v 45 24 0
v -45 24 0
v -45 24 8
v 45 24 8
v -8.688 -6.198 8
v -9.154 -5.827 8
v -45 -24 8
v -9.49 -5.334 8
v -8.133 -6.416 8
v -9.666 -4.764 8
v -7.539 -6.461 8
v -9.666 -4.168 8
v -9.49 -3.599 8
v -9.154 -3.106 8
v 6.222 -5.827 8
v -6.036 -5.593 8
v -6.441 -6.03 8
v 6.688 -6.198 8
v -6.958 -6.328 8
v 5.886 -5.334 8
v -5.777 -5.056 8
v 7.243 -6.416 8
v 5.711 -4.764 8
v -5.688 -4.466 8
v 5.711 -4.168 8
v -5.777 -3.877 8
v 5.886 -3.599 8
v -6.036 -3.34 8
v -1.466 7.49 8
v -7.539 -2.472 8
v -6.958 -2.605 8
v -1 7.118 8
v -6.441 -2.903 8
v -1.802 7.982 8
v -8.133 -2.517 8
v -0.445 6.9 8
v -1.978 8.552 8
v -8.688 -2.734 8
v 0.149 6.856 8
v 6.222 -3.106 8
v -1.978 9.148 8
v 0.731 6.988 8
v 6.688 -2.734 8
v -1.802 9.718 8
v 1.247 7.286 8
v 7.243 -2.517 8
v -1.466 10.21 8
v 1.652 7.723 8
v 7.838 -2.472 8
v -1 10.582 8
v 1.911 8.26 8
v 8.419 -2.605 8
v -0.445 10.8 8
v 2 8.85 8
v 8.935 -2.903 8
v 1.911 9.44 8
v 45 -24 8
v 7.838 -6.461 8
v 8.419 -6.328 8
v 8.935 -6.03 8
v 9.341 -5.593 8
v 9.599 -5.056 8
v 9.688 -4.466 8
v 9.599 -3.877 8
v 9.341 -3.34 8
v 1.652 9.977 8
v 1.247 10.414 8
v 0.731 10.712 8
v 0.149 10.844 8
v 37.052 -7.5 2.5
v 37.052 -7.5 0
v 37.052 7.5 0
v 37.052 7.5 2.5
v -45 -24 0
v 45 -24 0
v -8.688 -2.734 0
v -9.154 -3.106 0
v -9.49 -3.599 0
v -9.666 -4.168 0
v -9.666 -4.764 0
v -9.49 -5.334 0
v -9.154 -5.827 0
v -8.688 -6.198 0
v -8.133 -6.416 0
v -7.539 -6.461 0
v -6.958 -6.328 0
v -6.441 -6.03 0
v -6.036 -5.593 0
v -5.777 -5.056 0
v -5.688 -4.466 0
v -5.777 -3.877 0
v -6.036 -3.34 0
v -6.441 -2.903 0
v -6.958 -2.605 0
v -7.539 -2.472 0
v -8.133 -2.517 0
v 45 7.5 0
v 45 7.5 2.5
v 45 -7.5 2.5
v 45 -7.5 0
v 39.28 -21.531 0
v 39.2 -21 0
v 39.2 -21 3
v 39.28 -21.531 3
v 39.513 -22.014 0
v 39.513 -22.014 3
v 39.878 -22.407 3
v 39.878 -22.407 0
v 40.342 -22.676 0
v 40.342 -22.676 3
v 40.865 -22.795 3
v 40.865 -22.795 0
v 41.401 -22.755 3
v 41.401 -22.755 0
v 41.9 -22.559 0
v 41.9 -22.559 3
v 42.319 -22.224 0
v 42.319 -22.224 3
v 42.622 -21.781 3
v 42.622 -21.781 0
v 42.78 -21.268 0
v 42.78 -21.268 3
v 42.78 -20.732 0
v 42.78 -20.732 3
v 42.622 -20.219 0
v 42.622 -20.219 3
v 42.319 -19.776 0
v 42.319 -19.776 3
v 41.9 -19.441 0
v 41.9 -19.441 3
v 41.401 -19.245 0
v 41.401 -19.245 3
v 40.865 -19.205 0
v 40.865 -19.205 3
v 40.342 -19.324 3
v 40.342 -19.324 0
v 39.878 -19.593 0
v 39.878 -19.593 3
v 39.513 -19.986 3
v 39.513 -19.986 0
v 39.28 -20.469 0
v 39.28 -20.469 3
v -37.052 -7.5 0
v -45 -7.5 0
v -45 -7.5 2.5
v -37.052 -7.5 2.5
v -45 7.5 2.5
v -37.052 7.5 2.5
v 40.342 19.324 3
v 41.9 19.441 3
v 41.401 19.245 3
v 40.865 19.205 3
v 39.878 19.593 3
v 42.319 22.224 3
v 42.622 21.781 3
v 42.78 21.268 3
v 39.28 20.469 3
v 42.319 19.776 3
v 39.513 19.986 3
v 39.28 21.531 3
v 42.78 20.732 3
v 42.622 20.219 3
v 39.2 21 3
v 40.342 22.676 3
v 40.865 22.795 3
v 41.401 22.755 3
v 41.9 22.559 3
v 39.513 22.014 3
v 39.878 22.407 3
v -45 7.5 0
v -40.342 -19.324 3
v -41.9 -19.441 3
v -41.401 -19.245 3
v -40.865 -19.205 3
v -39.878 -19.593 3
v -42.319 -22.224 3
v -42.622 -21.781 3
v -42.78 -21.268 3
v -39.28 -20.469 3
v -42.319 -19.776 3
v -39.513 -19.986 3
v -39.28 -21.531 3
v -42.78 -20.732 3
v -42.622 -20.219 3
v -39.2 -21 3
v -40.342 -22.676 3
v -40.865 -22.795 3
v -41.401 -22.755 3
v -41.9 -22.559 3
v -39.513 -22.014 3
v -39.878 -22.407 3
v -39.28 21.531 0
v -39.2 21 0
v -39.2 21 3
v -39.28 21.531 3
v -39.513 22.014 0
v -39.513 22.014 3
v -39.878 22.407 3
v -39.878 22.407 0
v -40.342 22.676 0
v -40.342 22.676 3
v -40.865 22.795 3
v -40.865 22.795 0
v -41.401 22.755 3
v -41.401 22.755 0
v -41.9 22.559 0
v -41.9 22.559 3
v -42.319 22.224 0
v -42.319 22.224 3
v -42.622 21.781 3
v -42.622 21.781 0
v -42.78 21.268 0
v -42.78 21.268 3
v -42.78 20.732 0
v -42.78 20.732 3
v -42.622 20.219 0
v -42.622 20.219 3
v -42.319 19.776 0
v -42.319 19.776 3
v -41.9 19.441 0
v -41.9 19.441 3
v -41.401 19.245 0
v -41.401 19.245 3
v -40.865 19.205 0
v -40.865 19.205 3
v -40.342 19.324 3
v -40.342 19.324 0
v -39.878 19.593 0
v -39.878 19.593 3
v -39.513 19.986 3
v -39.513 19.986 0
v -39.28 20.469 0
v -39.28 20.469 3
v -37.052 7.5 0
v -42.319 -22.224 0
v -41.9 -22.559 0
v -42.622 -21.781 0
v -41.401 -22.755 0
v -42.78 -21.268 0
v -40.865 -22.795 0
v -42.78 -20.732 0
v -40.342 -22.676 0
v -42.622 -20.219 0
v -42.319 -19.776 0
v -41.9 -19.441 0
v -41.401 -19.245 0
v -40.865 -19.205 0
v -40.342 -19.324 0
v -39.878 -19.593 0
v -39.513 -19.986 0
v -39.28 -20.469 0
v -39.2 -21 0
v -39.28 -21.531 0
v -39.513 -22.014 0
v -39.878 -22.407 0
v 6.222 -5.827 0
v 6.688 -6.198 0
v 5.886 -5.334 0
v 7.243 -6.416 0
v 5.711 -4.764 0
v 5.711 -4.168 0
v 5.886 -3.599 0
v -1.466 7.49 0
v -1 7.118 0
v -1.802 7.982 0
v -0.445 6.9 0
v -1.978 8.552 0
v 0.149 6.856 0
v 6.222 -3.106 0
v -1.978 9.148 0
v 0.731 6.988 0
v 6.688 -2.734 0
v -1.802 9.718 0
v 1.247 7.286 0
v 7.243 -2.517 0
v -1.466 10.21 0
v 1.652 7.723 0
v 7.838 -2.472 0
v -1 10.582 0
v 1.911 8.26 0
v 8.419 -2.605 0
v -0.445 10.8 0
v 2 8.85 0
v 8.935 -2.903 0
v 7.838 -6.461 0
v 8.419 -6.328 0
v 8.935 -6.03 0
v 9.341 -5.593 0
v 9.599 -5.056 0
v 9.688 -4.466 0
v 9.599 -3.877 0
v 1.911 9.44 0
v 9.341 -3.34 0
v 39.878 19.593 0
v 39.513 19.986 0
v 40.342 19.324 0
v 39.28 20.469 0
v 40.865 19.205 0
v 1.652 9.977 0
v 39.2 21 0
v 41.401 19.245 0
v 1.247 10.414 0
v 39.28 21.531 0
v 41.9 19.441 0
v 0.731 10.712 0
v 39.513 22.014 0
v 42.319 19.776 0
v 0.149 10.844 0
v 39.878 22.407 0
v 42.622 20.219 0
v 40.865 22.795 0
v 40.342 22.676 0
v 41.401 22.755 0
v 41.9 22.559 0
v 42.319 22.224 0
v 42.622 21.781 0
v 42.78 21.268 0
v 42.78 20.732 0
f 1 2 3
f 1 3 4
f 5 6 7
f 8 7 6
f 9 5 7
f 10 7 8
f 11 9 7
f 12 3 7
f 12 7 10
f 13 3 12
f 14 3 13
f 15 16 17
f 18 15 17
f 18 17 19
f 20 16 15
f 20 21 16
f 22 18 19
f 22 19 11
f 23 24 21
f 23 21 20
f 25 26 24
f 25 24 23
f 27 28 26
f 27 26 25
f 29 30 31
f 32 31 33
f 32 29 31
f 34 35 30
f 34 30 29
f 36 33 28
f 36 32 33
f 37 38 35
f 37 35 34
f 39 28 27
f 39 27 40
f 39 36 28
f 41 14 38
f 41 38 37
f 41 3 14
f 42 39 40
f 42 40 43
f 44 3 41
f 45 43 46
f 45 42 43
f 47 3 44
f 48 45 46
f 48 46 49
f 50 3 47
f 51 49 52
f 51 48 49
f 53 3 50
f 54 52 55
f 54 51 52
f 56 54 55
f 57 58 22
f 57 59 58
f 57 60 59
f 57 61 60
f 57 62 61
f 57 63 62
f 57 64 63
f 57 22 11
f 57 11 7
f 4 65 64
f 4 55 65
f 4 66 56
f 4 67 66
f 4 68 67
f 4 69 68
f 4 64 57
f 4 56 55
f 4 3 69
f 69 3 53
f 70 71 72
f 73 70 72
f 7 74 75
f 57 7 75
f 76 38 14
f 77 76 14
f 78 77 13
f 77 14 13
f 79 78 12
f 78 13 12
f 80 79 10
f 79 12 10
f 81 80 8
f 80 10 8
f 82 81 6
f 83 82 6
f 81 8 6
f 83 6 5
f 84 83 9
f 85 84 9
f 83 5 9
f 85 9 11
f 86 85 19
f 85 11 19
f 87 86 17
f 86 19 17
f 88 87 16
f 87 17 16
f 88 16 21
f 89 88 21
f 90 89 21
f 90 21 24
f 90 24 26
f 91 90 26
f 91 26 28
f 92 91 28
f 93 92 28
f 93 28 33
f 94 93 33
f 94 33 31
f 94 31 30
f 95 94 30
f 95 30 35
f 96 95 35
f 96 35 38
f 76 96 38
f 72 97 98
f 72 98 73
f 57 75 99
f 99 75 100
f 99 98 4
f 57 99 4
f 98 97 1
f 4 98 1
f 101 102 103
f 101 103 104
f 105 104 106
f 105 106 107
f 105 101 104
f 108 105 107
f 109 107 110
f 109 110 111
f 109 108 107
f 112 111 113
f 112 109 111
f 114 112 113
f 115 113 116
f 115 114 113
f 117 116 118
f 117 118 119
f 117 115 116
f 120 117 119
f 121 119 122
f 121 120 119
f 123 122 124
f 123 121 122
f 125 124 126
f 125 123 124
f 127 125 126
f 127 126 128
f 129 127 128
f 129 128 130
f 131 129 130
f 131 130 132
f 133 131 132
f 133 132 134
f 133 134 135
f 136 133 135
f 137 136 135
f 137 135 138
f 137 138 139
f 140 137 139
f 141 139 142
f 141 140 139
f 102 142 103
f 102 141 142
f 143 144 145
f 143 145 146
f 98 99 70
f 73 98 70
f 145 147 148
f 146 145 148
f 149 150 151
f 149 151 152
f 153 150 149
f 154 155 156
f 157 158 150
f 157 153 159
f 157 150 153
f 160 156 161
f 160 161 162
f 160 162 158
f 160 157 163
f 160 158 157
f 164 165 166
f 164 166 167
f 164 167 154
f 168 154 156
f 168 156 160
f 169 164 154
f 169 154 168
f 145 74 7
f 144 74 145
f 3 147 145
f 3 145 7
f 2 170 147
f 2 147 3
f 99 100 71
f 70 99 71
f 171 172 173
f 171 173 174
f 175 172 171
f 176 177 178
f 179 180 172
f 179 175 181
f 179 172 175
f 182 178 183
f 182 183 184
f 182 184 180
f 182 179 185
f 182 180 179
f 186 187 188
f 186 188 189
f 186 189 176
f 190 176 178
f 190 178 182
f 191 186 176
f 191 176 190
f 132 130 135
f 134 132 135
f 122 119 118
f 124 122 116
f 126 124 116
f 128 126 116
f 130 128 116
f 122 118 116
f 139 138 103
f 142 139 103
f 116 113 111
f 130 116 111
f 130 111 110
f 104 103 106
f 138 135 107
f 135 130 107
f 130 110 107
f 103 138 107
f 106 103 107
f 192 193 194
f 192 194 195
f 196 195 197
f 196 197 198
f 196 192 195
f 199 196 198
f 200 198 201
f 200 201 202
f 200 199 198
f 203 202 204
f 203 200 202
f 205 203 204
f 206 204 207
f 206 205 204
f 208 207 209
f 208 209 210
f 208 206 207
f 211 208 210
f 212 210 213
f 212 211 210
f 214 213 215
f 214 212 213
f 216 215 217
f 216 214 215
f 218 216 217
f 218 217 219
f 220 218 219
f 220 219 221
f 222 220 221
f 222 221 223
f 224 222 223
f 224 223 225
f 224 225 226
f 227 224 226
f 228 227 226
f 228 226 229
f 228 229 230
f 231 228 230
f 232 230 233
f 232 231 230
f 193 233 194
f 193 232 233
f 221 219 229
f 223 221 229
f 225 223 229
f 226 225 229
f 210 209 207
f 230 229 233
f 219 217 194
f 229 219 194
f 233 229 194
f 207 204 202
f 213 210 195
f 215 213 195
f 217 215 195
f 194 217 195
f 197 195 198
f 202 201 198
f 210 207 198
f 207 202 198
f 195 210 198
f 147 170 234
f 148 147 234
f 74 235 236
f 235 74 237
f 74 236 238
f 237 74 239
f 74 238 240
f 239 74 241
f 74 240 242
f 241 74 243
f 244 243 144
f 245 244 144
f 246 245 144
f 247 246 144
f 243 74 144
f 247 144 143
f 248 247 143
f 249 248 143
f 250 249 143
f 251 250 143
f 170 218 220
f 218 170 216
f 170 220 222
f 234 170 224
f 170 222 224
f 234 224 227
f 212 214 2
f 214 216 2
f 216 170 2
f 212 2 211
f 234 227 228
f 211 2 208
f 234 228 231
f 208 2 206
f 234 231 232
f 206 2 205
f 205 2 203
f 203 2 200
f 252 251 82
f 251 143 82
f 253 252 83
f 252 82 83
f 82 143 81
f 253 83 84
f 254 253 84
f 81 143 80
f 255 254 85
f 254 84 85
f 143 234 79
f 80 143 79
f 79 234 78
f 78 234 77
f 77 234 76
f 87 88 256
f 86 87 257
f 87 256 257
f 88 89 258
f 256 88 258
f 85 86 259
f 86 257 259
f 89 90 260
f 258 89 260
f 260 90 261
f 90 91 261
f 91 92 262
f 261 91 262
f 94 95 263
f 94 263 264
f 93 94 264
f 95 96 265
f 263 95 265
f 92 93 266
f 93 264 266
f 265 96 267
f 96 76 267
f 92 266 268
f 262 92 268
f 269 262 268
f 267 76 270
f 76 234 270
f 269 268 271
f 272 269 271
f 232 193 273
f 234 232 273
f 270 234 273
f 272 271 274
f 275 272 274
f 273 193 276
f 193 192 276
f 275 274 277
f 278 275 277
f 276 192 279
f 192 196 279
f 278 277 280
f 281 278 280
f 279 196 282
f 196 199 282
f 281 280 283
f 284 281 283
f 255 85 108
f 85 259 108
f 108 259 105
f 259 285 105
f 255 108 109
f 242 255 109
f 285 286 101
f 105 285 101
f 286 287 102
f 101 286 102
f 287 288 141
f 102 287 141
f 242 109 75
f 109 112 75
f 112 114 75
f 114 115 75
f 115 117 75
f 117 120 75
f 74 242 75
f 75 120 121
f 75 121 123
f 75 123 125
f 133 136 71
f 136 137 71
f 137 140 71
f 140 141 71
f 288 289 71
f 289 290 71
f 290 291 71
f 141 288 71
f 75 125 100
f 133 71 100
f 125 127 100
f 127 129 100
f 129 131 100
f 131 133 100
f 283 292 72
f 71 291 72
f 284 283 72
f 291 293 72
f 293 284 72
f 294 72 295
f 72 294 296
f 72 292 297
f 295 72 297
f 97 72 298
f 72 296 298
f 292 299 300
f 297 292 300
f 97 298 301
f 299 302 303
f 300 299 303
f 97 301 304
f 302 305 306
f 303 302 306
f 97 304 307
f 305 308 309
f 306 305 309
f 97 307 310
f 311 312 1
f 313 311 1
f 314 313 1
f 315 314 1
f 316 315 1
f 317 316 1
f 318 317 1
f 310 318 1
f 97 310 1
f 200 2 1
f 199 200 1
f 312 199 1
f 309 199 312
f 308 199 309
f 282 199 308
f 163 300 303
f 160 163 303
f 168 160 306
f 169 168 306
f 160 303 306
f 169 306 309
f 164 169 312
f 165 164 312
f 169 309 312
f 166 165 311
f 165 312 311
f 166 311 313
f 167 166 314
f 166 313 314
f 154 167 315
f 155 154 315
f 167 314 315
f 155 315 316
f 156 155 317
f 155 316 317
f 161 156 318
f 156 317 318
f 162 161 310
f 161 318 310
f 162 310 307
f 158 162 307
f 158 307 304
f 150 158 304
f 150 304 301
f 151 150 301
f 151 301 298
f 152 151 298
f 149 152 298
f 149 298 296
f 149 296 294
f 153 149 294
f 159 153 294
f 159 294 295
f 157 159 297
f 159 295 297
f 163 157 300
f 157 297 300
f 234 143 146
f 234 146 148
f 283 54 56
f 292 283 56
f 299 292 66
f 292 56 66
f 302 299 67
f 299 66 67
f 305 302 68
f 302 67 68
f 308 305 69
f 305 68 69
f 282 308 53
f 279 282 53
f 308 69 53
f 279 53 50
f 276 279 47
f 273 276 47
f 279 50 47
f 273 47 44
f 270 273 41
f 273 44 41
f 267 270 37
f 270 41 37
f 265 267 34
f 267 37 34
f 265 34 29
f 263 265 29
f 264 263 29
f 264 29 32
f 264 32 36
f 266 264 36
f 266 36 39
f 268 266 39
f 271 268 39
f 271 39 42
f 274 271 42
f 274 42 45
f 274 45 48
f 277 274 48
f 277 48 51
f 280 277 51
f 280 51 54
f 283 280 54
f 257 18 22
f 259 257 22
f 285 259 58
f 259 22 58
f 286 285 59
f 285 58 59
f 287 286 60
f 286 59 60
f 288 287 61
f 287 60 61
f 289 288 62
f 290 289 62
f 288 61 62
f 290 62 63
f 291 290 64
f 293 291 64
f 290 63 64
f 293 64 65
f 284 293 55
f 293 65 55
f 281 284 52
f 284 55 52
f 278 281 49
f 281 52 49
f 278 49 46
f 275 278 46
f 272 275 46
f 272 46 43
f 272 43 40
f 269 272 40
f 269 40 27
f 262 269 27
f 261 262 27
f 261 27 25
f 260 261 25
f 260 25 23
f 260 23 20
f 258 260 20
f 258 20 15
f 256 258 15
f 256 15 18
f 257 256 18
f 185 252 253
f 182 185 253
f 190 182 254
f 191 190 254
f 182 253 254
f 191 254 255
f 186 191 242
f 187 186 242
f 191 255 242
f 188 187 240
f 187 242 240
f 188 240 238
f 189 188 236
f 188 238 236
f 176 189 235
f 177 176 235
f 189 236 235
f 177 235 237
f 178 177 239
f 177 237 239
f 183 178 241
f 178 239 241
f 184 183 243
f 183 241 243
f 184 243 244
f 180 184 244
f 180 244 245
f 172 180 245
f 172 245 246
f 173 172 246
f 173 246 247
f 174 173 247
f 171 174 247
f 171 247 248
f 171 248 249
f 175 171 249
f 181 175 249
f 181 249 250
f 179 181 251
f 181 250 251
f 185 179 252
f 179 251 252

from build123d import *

# Parameters (mm, degrees)
SKETCH_1_W               = 90
SKETCH_1_H               = 48
EXTRUDE_1_DEPTH          = 8
SKETCH_6_R               = 1.8
CUT_EXTRUDE_4_DEPTH      = 3
MIRROR_6_COPY_1_SKETCH_R = 1.8
MIRROR_6_COPY_1_DEPTH    = 3
SKETCH_7_W               = 16
SKETCH_7_H               = 15
CUT_EXTRUDE_5_DEPTH      = 2.5
SKETCH_4_R               = 2
CUT_EXTRUDE_6_DEPTH      = 10
PATTERN_CIRCULAR_1_COUNT = 3


with BuildPart() as part:
    # 草图1 → 凸台-拉伸1 (new body)
    with BuildSketch(Plane.XY):
        Rectangle(SKETCH_1_W, SKETCH_1_H)
    extrude(amount=EXTRUDE_1_DEPTH)

    # 草图6 → 切除-拉伸4 (cut)
    with BuildSketch(Plane(origin=(0, 0, 0), x_dir=(-1, 0, 0), z_dir=(0, 0, -1))):
        with Locations((-41, 21)):
            Circle(SKETCH_6_R)
    cut_extrude_4 = extrude(amount=-CUT_EXTRUDE_4_DEPTH, mode=Mode.SUBTRACT)

    # 镜向5: 切除-拉伸4 across plane
    add(cut_extrude_4.mirror(Plane.ZX), mode=Mode.SUBTRACT)

    # 镜向6: 切除-拉伸4 across plane
    add(cut_extrude_4.mirror(Plane(origin=(0, 0, 0), x_dir=(0, 0, 1), z_dir=(1, 0, 0))), mode=Mode.SUBTRACT)

    # 镜向6 copy 1 sketch → 镜向6 copy 1 (cut)
    with BuildSketch(Plane(origin=(0, 0, 0), x_dir=(1, 0, 0), z_dir=(0, 0, -1))):
        with Locations((-41, 21)):
            Circle(MIRROR_6_COPY_1_SKETCH_R)
    extrude(amount=-MIRROR_6_COPY_1_DEPTH, mode=Mode.SUBTRACT)

    # 草图7 → 切除-拉伸5 (cut)
    with BuildSketch(Plane(origin=(0, 0, 0), x_dir=(-1, 0, 0), z_dir=(0, 0, -1))):
        with Locations((-45.051826461, 0)):
            Rectangle(SKETCH_7_W, SKETCH_7_H)
    cut_extrude_5 = extrude(amount=-CUT_EXTRUDE_5_DEPTH, mode=Mode.SUBTRACT)

    # 镜向7: 切除-拉伸5 across plane
    add(cut_extrude_5.mirror(Plane(origin=(0, 0, 0), x_dir=(0, 0, 1), z_dir=(1, 0, 0))), mode=Mode.SUBTRACT)

    # 草图4 → 切除-拉伸6 (cut)
    with BuildSketch(Plane.XY.offset(8)):
        with Locations((0, 8.85)):
            Circle(SKETCH_4_R)
    cut_extrude_6 = extrude(amount=-CUT_EXTRUDE_6_DEPTH, mode=Mode.SUBTRACT)

    # 阵列(圆周)1: 切除-拉伸6 ×3 about axis
    pattern_circular_1_axis = Axis((0, -0.027607952, 0), (0, 0, 1))
    for i in range(1, PATTERN_CIRCULAR_1_COUNT):
        add(cut_extrude_6.rotate(pattern_circular_1_axis, i * 360 / PATTERN_CIRCULAR_1_COUNT), mode=Mode.SUBTRACT)


solid = part.part
